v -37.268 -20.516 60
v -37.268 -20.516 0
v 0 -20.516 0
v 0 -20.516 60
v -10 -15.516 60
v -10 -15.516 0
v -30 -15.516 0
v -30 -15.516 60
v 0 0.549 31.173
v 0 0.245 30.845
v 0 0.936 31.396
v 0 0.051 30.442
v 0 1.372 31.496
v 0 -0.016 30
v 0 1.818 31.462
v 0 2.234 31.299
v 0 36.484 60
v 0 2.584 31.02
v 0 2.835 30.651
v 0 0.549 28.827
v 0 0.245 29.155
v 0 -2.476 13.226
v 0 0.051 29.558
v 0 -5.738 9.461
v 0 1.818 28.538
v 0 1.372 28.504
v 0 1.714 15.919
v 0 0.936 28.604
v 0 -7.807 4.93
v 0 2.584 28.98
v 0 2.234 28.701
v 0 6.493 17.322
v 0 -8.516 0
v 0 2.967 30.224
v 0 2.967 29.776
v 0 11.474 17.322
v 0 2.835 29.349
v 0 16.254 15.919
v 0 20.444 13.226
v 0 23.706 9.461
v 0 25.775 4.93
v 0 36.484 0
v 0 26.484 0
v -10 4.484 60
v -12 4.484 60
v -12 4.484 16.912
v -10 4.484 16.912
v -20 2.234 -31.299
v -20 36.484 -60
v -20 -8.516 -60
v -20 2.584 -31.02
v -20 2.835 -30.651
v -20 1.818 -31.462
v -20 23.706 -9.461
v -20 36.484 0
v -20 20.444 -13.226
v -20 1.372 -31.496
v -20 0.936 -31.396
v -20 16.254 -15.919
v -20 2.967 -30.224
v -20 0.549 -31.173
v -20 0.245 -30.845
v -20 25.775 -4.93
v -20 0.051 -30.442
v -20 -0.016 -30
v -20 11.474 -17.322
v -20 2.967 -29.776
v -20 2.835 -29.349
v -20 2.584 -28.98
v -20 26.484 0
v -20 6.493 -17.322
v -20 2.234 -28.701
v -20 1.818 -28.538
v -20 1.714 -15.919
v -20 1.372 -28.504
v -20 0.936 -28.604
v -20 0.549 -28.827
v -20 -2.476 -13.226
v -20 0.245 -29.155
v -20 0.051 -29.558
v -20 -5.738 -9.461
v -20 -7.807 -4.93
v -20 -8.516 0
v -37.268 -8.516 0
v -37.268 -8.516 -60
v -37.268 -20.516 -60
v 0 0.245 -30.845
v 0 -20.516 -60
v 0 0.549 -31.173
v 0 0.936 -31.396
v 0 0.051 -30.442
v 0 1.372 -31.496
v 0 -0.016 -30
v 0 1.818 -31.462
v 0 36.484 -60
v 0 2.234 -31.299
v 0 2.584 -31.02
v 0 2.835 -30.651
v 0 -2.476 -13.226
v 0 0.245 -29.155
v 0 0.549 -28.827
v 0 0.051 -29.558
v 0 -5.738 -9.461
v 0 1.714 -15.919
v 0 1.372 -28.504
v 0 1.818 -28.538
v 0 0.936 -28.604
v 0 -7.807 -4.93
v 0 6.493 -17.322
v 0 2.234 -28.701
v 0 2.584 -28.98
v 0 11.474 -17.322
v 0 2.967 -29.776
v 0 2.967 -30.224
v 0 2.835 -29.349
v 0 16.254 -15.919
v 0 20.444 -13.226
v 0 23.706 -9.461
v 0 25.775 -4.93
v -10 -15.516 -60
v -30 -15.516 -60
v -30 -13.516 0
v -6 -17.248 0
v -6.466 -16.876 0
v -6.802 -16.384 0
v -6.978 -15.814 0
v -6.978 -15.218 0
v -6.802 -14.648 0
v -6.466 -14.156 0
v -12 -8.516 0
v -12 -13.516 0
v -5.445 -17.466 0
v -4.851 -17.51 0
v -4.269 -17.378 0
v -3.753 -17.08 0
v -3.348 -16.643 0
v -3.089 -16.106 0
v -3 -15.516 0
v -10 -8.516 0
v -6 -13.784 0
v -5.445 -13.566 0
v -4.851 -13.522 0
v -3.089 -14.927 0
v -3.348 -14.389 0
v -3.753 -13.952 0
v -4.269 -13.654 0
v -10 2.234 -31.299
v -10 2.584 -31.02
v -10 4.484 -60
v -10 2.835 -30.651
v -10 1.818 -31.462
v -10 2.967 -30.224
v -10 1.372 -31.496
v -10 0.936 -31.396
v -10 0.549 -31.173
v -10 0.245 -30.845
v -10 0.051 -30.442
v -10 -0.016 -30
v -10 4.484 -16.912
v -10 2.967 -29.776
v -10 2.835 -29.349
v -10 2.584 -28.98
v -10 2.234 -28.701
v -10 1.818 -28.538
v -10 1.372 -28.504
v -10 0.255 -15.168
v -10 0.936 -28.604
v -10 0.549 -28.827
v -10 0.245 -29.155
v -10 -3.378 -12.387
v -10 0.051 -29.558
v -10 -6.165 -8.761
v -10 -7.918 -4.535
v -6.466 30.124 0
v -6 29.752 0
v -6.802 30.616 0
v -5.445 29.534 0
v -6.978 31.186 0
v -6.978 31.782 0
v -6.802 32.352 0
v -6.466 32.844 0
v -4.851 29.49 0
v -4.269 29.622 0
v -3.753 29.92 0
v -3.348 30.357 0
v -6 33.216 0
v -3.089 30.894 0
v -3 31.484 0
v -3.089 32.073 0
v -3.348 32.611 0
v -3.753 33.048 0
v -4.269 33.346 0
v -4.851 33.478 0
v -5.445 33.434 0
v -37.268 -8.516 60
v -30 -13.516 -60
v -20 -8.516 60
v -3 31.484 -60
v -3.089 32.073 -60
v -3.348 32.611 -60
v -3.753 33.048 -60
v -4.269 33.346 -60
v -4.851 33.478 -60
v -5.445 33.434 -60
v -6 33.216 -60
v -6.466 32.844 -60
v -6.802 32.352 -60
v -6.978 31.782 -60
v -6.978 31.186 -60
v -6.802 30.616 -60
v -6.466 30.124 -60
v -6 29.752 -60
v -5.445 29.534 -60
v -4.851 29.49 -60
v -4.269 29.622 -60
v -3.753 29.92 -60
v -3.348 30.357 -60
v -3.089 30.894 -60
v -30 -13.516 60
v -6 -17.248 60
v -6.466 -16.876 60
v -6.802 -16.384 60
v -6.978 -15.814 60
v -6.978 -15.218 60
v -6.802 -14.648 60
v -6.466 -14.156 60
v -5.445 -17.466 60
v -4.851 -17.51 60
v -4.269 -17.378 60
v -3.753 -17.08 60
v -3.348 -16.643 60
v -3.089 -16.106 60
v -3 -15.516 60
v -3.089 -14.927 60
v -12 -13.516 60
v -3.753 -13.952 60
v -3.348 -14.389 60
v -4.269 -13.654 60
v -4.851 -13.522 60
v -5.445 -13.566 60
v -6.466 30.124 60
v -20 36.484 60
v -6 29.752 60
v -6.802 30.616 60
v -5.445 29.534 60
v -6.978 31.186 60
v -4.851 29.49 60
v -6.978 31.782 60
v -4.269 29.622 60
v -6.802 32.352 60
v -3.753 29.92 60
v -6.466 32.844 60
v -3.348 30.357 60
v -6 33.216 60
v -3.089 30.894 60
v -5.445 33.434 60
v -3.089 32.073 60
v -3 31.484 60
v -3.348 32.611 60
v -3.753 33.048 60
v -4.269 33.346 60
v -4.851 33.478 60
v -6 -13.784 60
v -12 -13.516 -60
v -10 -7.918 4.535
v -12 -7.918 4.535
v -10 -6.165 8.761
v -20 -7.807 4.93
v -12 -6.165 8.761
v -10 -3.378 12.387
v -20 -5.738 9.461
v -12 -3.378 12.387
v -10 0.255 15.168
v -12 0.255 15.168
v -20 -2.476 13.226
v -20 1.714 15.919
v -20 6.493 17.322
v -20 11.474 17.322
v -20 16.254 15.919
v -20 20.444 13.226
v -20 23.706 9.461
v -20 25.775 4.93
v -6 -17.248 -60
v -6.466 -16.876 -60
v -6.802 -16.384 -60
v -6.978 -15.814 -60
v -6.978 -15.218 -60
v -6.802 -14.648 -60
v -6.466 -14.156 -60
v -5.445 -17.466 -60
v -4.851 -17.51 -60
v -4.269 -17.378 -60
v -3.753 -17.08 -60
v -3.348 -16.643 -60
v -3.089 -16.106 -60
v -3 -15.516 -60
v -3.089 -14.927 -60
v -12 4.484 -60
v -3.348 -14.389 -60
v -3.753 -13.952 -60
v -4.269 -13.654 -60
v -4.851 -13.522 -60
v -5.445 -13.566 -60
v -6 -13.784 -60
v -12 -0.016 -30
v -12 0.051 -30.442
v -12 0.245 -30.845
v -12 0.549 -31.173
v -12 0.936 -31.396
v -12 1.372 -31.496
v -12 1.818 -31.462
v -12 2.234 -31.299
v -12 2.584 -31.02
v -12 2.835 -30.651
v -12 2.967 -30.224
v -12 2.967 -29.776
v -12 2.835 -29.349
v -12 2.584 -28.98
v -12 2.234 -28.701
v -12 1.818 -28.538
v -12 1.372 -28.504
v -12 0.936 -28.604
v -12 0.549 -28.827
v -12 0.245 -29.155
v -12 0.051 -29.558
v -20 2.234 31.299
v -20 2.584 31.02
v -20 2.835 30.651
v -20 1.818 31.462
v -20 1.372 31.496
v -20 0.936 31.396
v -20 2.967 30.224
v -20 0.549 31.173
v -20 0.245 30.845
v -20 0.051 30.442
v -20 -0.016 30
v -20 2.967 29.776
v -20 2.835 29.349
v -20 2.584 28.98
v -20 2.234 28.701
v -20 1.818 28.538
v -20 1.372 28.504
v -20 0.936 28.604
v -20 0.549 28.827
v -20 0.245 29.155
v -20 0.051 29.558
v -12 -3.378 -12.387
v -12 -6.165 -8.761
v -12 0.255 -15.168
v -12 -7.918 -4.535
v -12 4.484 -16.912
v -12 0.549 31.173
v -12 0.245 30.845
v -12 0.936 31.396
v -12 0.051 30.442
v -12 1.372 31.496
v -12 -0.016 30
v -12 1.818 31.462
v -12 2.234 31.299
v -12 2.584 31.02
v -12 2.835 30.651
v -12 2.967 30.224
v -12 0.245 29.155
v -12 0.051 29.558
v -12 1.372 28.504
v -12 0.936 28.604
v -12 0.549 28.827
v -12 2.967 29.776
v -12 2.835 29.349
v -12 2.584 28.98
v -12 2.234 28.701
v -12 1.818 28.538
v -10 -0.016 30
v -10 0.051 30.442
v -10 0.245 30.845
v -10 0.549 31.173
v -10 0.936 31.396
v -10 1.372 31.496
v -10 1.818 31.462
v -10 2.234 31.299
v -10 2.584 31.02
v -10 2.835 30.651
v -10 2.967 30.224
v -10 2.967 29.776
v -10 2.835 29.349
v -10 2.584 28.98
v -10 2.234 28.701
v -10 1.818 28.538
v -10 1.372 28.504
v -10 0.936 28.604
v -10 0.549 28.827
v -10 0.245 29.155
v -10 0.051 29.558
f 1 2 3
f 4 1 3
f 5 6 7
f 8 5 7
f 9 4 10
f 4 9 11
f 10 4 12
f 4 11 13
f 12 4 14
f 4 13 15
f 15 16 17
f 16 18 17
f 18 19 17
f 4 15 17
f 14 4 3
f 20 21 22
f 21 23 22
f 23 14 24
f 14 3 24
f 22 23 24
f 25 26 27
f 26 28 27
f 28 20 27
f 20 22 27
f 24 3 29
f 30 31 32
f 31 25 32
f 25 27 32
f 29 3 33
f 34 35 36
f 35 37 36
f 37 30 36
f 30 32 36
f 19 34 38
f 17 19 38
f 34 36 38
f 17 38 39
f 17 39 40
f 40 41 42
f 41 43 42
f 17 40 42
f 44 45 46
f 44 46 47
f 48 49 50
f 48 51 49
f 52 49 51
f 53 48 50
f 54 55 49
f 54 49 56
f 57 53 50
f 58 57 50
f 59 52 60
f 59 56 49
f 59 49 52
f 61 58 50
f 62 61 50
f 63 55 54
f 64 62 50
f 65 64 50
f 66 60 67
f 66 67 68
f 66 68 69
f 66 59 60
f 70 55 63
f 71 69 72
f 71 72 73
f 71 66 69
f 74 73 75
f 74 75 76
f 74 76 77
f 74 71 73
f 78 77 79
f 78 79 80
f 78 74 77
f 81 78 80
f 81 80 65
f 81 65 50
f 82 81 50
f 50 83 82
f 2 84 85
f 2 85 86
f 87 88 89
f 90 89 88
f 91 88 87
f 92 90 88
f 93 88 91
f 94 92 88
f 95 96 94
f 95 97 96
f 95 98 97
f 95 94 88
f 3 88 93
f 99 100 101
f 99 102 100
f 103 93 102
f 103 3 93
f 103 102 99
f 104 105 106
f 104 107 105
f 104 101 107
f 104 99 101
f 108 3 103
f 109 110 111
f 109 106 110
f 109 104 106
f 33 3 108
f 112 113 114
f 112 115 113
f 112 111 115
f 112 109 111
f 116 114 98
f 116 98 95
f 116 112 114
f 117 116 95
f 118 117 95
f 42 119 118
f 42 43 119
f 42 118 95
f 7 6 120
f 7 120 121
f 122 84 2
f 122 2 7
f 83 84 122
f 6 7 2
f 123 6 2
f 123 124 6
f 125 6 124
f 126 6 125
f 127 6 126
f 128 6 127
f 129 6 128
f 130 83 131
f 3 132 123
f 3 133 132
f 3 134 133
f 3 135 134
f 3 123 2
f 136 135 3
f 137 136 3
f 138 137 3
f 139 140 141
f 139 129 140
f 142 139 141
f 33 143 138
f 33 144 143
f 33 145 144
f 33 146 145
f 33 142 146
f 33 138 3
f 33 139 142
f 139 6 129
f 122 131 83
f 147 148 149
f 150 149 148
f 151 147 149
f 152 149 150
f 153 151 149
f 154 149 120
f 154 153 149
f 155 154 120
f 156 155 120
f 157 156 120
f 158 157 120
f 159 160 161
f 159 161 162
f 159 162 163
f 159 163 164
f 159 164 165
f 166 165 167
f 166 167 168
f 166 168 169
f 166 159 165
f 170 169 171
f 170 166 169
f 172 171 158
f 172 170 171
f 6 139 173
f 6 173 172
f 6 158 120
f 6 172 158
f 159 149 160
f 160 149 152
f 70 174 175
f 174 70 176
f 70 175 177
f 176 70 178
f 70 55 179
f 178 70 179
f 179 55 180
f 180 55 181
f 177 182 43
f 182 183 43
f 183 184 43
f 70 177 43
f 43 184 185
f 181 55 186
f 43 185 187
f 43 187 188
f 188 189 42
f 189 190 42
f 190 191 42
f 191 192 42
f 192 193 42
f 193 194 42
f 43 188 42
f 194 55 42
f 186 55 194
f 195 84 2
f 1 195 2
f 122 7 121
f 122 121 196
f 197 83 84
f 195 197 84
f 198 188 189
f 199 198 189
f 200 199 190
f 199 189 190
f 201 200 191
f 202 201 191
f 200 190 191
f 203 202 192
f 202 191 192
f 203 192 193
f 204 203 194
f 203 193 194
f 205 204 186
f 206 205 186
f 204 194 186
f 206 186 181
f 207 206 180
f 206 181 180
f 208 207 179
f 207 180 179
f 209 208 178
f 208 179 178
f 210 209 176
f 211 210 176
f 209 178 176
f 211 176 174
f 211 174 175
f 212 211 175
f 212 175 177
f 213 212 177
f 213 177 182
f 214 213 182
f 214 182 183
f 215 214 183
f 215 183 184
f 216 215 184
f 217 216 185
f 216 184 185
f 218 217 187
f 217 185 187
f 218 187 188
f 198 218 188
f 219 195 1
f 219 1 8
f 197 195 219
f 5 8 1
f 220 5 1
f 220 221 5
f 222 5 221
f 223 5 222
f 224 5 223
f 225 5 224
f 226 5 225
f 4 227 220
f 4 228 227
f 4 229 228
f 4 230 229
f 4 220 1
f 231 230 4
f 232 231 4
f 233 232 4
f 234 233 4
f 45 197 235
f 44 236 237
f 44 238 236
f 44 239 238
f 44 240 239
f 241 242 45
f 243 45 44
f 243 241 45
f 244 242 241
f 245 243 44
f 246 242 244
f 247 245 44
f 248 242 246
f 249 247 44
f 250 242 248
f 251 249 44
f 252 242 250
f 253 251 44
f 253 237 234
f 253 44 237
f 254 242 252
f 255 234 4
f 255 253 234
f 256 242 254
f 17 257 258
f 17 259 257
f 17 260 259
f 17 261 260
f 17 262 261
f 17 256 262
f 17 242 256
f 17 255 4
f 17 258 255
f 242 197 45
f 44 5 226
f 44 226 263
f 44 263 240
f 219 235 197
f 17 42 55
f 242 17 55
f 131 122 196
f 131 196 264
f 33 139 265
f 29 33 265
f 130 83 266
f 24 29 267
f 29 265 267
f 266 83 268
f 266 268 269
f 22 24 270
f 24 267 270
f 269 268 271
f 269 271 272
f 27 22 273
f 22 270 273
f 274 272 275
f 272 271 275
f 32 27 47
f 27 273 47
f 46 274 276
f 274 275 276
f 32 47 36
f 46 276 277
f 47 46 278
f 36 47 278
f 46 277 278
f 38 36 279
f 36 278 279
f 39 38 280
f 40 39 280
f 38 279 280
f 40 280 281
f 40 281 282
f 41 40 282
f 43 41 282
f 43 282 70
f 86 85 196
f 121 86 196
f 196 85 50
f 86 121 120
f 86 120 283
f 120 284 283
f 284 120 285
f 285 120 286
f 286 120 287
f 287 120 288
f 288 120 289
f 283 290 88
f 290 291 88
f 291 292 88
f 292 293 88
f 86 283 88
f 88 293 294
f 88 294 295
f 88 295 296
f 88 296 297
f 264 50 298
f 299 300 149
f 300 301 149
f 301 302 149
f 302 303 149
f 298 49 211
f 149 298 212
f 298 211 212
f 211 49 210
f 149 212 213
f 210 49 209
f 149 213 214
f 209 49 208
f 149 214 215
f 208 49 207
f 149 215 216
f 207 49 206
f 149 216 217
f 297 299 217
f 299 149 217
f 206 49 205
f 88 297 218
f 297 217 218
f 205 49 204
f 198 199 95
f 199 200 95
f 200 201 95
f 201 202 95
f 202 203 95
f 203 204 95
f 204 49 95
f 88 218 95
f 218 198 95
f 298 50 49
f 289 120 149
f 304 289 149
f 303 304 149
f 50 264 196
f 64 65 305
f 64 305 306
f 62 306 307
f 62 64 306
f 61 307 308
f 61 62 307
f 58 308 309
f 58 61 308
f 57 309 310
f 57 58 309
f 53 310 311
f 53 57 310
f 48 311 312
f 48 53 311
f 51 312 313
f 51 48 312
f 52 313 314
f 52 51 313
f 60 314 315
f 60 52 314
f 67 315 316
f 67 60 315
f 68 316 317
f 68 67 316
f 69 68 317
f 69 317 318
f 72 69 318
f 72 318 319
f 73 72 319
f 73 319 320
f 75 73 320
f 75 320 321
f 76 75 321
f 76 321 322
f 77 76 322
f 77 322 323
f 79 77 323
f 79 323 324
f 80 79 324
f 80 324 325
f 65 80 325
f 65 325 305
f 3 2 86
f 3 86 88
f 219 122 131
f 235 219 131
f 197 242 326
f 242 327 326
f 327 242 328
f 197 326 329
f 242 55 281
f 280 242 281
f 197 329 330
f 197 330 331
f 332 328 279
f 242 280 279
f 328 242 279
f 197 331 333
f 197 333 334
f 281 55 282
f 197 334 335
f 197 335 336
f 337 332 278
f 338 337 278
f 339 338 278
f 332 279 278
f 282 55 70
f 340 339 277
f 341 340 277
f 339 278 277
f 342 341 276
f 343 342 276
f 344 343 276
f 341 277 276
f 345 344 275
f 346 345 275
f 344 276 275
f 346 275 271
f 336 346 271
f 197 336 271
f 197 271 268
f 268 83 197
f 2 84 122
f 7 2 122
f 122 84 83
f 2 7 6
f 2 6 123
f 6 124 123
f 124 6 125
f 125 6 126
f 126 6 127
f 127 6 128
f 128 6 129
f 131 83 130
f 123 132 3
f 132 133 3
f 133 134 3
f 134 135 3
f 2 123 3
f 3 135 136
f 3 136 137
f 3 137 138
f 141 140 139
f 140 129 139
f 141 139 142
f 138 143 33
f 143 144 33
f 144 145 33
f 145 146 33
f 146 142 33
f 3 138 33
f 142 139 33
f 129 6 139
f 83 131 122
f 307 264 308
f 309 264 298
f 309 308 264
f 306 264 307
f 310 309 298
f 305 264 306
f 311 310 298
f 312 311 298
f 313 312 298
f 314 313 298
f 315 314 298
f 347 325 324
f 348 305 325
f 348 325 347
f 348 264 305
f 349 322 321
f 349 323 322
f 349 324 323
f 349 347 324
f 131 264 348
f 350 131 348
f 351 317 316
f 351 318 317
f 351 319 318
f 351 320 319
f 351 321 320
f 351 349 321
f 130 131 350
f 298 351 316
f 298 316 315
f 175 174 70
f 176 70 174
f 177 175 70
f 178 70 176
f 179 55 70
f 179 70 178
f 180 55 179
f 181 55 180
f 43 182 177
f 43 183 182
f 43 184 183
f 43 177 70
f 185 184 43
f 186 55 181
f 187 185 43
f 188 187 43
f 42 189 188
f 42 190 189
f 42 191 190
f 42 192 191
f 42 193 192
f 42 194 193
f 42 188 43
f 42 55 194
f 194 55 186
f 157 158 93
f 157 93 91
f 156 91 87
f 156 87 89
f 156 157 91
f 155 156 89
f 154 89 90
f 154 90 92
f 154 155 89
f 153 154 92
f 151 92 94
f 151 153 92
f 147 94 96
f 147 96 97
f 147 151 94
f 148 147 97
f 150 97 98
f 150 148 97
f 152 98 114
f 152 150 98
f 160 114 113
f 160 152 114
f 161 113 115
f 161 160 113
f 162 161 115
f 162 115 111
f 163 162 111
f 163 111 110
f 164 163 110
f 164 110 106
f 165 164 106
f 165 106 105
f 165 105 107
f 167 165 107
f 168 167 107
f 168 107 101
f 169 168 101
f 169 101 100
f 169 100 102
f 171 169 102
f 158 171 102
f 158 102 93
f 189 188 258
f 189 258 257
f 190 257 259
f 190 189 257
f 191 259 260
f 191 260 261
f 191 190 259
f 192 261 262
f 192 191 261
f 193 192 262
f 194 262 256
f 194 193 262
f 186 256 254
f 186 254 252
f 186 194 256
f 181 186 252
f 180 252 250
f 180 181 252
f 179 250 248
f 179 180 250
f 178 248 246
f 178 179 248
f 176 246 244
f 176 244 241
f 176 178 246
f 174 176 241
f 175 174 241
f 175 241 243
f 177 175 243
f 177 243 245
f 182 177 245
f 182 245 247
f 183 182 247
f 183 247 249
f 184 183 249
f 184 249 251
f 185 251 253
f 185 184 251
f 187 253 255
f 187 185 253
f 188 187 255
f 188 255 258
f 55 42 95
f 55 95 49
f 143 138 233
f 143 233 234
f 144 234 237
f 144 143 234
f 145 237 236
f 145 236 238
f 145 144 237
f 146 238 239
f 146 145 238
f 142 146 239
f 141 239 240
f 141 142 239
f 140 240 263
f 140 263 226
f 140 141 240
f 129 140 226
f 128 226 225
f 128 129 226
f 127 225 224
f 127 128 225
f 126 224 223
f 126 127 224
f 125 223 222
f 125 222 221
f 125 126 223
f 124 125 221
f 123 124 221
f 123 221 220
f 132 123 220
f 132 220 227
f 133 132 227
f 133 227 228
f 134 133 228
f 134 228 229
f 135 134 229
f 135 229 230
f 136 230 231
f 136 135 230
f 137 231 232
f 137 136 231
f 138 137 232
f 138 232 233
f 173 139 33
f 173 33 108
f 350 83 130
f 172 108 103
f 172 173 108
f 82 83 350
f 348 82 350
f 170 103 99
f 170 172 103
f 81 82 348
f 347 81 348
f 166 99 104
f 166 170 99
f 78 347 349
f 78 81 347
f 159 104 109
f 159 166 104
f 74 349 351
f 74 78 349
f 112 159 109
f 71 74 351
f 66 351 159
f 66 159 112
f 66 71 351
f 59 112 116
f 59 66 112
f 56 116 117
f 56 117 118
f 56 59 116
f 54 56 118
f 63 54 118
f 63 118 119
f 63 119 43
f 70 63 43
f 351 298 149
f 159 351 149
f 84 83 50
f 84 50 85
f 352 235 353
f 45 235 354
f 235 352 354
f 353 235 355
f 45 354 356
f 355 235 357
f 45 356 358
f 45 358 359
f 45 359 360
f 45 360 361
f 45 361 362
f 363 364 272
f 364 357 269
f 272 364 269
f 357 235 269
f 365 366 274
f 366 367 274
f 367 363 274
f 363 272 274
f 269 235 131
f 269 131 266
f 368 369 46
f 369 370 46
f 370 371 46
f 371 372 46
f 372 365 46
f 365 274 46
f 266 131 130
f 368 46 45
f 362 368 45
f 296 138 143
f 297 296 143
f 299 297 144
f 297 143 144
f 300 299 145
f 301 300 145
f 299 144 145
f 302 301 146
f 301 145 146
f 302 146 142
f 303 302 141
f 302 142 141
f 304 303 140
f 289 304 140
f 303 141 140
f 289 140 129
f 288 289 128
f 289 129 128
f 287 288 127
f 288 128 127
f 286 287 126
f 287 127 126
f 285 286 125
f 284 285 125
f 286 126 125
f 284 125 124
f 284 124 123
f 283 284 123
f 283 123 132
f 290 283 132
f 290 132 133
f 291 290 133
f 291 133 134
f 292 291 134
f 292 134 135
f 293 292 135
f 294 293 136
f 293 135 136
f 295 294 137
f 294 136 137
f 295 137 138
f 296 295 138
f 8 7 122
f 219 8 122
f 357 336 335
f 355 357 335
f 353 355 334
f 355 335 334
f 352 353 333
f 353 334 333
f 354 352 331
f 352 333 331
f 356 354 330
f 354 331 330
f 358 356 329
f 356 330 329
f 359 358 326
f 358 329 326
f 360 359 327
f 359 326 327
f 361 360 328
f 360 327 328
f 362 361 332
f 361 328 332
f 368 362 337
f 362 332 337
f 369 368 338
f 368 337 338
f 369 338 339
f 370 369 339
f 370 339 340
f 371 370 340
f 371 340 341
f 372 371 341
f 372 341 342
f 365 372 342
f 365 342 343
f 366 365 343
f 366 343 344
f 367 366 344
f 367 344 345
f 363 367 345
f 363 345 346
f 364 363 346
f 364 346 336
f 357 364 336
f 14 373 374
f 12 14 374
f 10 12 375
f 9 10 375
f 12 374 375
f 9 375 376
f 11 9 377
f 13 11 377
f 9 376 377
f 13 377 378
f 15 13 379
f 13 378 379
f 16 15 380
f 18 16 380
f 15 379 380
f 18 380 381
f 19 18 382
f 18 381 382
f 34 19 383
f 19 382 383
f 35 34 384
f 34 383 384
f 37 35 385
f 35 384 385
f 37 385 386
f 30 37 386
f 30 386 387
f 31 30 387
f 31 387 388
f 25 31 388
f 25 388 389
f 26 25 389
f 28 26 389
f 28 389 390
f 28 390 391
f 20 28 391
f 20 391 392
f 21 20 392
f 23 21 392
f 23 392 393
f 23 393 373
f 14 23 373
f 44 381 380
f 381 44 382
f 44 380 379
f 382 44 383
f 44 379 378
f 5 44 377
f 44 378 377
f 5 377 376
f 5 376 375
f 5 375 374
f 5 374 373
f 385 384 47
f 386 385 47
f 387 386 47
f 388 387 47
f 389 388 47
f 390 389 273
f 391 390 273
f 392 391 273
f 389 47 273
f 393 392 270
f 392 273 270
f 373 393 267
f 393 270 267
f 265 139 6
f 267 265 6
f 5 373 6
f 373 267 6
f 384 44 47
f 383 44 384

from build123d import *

# Parameters (mm, degrees)
F0_R     = 2
F1_DEPTH = 60
F2_R     = 1.5
F2_R_2   = 17.5
F3_DEPTH = 20.001


with BuildPart() as f1:
    # F0 (on Top) → F1 (new body)
    with BuildSketch(Plane.XY):
        Polygon((0, 36.483967), (-20, 36.483967), (-20, -8.516033), (-37.267761, -8.516033), (-37.267761, -20.516033), (0, -20.516033), align=None)
        Polygon((-10, -15.516033), (-30, -15.516033), (-30, -13.516033), (-12, -13.516033), (-12, 4.483967), (-10, 4.483967), align=None, mode=Mode.SUBTRACT)
        with Locations((-5, -15.516033)):
            Circle(F0_R, mode=Mode.SUBTRACT)
        with Locations((-5, 31.483967)):
            Circle(F0_R, mode=Mode.SUBTRACT)
    extrude(amount=F1_DEPTH)

    # F2 (on face) → F3 (cut, through all)
    with BuildSketch(Plane(origin=(-20, 0, 0), x_dir=(0, -1, 0), z_dir=(-1, 0, 0))):
        with Locations((-1.483967, 30)):
            Circle(F2_R)
        with Locations((-8.983967, 0)):
            Circle(F2_R_2)
    extrude(amount=-F3_DEPTH, mode=Mode.SUBTRACT)


with BuildPart() as f4_1:
    # F4: instance of F1
    add(f1.part.mirror(Plane.XY))


solid = Compound([f1.part, f4_1.part])
